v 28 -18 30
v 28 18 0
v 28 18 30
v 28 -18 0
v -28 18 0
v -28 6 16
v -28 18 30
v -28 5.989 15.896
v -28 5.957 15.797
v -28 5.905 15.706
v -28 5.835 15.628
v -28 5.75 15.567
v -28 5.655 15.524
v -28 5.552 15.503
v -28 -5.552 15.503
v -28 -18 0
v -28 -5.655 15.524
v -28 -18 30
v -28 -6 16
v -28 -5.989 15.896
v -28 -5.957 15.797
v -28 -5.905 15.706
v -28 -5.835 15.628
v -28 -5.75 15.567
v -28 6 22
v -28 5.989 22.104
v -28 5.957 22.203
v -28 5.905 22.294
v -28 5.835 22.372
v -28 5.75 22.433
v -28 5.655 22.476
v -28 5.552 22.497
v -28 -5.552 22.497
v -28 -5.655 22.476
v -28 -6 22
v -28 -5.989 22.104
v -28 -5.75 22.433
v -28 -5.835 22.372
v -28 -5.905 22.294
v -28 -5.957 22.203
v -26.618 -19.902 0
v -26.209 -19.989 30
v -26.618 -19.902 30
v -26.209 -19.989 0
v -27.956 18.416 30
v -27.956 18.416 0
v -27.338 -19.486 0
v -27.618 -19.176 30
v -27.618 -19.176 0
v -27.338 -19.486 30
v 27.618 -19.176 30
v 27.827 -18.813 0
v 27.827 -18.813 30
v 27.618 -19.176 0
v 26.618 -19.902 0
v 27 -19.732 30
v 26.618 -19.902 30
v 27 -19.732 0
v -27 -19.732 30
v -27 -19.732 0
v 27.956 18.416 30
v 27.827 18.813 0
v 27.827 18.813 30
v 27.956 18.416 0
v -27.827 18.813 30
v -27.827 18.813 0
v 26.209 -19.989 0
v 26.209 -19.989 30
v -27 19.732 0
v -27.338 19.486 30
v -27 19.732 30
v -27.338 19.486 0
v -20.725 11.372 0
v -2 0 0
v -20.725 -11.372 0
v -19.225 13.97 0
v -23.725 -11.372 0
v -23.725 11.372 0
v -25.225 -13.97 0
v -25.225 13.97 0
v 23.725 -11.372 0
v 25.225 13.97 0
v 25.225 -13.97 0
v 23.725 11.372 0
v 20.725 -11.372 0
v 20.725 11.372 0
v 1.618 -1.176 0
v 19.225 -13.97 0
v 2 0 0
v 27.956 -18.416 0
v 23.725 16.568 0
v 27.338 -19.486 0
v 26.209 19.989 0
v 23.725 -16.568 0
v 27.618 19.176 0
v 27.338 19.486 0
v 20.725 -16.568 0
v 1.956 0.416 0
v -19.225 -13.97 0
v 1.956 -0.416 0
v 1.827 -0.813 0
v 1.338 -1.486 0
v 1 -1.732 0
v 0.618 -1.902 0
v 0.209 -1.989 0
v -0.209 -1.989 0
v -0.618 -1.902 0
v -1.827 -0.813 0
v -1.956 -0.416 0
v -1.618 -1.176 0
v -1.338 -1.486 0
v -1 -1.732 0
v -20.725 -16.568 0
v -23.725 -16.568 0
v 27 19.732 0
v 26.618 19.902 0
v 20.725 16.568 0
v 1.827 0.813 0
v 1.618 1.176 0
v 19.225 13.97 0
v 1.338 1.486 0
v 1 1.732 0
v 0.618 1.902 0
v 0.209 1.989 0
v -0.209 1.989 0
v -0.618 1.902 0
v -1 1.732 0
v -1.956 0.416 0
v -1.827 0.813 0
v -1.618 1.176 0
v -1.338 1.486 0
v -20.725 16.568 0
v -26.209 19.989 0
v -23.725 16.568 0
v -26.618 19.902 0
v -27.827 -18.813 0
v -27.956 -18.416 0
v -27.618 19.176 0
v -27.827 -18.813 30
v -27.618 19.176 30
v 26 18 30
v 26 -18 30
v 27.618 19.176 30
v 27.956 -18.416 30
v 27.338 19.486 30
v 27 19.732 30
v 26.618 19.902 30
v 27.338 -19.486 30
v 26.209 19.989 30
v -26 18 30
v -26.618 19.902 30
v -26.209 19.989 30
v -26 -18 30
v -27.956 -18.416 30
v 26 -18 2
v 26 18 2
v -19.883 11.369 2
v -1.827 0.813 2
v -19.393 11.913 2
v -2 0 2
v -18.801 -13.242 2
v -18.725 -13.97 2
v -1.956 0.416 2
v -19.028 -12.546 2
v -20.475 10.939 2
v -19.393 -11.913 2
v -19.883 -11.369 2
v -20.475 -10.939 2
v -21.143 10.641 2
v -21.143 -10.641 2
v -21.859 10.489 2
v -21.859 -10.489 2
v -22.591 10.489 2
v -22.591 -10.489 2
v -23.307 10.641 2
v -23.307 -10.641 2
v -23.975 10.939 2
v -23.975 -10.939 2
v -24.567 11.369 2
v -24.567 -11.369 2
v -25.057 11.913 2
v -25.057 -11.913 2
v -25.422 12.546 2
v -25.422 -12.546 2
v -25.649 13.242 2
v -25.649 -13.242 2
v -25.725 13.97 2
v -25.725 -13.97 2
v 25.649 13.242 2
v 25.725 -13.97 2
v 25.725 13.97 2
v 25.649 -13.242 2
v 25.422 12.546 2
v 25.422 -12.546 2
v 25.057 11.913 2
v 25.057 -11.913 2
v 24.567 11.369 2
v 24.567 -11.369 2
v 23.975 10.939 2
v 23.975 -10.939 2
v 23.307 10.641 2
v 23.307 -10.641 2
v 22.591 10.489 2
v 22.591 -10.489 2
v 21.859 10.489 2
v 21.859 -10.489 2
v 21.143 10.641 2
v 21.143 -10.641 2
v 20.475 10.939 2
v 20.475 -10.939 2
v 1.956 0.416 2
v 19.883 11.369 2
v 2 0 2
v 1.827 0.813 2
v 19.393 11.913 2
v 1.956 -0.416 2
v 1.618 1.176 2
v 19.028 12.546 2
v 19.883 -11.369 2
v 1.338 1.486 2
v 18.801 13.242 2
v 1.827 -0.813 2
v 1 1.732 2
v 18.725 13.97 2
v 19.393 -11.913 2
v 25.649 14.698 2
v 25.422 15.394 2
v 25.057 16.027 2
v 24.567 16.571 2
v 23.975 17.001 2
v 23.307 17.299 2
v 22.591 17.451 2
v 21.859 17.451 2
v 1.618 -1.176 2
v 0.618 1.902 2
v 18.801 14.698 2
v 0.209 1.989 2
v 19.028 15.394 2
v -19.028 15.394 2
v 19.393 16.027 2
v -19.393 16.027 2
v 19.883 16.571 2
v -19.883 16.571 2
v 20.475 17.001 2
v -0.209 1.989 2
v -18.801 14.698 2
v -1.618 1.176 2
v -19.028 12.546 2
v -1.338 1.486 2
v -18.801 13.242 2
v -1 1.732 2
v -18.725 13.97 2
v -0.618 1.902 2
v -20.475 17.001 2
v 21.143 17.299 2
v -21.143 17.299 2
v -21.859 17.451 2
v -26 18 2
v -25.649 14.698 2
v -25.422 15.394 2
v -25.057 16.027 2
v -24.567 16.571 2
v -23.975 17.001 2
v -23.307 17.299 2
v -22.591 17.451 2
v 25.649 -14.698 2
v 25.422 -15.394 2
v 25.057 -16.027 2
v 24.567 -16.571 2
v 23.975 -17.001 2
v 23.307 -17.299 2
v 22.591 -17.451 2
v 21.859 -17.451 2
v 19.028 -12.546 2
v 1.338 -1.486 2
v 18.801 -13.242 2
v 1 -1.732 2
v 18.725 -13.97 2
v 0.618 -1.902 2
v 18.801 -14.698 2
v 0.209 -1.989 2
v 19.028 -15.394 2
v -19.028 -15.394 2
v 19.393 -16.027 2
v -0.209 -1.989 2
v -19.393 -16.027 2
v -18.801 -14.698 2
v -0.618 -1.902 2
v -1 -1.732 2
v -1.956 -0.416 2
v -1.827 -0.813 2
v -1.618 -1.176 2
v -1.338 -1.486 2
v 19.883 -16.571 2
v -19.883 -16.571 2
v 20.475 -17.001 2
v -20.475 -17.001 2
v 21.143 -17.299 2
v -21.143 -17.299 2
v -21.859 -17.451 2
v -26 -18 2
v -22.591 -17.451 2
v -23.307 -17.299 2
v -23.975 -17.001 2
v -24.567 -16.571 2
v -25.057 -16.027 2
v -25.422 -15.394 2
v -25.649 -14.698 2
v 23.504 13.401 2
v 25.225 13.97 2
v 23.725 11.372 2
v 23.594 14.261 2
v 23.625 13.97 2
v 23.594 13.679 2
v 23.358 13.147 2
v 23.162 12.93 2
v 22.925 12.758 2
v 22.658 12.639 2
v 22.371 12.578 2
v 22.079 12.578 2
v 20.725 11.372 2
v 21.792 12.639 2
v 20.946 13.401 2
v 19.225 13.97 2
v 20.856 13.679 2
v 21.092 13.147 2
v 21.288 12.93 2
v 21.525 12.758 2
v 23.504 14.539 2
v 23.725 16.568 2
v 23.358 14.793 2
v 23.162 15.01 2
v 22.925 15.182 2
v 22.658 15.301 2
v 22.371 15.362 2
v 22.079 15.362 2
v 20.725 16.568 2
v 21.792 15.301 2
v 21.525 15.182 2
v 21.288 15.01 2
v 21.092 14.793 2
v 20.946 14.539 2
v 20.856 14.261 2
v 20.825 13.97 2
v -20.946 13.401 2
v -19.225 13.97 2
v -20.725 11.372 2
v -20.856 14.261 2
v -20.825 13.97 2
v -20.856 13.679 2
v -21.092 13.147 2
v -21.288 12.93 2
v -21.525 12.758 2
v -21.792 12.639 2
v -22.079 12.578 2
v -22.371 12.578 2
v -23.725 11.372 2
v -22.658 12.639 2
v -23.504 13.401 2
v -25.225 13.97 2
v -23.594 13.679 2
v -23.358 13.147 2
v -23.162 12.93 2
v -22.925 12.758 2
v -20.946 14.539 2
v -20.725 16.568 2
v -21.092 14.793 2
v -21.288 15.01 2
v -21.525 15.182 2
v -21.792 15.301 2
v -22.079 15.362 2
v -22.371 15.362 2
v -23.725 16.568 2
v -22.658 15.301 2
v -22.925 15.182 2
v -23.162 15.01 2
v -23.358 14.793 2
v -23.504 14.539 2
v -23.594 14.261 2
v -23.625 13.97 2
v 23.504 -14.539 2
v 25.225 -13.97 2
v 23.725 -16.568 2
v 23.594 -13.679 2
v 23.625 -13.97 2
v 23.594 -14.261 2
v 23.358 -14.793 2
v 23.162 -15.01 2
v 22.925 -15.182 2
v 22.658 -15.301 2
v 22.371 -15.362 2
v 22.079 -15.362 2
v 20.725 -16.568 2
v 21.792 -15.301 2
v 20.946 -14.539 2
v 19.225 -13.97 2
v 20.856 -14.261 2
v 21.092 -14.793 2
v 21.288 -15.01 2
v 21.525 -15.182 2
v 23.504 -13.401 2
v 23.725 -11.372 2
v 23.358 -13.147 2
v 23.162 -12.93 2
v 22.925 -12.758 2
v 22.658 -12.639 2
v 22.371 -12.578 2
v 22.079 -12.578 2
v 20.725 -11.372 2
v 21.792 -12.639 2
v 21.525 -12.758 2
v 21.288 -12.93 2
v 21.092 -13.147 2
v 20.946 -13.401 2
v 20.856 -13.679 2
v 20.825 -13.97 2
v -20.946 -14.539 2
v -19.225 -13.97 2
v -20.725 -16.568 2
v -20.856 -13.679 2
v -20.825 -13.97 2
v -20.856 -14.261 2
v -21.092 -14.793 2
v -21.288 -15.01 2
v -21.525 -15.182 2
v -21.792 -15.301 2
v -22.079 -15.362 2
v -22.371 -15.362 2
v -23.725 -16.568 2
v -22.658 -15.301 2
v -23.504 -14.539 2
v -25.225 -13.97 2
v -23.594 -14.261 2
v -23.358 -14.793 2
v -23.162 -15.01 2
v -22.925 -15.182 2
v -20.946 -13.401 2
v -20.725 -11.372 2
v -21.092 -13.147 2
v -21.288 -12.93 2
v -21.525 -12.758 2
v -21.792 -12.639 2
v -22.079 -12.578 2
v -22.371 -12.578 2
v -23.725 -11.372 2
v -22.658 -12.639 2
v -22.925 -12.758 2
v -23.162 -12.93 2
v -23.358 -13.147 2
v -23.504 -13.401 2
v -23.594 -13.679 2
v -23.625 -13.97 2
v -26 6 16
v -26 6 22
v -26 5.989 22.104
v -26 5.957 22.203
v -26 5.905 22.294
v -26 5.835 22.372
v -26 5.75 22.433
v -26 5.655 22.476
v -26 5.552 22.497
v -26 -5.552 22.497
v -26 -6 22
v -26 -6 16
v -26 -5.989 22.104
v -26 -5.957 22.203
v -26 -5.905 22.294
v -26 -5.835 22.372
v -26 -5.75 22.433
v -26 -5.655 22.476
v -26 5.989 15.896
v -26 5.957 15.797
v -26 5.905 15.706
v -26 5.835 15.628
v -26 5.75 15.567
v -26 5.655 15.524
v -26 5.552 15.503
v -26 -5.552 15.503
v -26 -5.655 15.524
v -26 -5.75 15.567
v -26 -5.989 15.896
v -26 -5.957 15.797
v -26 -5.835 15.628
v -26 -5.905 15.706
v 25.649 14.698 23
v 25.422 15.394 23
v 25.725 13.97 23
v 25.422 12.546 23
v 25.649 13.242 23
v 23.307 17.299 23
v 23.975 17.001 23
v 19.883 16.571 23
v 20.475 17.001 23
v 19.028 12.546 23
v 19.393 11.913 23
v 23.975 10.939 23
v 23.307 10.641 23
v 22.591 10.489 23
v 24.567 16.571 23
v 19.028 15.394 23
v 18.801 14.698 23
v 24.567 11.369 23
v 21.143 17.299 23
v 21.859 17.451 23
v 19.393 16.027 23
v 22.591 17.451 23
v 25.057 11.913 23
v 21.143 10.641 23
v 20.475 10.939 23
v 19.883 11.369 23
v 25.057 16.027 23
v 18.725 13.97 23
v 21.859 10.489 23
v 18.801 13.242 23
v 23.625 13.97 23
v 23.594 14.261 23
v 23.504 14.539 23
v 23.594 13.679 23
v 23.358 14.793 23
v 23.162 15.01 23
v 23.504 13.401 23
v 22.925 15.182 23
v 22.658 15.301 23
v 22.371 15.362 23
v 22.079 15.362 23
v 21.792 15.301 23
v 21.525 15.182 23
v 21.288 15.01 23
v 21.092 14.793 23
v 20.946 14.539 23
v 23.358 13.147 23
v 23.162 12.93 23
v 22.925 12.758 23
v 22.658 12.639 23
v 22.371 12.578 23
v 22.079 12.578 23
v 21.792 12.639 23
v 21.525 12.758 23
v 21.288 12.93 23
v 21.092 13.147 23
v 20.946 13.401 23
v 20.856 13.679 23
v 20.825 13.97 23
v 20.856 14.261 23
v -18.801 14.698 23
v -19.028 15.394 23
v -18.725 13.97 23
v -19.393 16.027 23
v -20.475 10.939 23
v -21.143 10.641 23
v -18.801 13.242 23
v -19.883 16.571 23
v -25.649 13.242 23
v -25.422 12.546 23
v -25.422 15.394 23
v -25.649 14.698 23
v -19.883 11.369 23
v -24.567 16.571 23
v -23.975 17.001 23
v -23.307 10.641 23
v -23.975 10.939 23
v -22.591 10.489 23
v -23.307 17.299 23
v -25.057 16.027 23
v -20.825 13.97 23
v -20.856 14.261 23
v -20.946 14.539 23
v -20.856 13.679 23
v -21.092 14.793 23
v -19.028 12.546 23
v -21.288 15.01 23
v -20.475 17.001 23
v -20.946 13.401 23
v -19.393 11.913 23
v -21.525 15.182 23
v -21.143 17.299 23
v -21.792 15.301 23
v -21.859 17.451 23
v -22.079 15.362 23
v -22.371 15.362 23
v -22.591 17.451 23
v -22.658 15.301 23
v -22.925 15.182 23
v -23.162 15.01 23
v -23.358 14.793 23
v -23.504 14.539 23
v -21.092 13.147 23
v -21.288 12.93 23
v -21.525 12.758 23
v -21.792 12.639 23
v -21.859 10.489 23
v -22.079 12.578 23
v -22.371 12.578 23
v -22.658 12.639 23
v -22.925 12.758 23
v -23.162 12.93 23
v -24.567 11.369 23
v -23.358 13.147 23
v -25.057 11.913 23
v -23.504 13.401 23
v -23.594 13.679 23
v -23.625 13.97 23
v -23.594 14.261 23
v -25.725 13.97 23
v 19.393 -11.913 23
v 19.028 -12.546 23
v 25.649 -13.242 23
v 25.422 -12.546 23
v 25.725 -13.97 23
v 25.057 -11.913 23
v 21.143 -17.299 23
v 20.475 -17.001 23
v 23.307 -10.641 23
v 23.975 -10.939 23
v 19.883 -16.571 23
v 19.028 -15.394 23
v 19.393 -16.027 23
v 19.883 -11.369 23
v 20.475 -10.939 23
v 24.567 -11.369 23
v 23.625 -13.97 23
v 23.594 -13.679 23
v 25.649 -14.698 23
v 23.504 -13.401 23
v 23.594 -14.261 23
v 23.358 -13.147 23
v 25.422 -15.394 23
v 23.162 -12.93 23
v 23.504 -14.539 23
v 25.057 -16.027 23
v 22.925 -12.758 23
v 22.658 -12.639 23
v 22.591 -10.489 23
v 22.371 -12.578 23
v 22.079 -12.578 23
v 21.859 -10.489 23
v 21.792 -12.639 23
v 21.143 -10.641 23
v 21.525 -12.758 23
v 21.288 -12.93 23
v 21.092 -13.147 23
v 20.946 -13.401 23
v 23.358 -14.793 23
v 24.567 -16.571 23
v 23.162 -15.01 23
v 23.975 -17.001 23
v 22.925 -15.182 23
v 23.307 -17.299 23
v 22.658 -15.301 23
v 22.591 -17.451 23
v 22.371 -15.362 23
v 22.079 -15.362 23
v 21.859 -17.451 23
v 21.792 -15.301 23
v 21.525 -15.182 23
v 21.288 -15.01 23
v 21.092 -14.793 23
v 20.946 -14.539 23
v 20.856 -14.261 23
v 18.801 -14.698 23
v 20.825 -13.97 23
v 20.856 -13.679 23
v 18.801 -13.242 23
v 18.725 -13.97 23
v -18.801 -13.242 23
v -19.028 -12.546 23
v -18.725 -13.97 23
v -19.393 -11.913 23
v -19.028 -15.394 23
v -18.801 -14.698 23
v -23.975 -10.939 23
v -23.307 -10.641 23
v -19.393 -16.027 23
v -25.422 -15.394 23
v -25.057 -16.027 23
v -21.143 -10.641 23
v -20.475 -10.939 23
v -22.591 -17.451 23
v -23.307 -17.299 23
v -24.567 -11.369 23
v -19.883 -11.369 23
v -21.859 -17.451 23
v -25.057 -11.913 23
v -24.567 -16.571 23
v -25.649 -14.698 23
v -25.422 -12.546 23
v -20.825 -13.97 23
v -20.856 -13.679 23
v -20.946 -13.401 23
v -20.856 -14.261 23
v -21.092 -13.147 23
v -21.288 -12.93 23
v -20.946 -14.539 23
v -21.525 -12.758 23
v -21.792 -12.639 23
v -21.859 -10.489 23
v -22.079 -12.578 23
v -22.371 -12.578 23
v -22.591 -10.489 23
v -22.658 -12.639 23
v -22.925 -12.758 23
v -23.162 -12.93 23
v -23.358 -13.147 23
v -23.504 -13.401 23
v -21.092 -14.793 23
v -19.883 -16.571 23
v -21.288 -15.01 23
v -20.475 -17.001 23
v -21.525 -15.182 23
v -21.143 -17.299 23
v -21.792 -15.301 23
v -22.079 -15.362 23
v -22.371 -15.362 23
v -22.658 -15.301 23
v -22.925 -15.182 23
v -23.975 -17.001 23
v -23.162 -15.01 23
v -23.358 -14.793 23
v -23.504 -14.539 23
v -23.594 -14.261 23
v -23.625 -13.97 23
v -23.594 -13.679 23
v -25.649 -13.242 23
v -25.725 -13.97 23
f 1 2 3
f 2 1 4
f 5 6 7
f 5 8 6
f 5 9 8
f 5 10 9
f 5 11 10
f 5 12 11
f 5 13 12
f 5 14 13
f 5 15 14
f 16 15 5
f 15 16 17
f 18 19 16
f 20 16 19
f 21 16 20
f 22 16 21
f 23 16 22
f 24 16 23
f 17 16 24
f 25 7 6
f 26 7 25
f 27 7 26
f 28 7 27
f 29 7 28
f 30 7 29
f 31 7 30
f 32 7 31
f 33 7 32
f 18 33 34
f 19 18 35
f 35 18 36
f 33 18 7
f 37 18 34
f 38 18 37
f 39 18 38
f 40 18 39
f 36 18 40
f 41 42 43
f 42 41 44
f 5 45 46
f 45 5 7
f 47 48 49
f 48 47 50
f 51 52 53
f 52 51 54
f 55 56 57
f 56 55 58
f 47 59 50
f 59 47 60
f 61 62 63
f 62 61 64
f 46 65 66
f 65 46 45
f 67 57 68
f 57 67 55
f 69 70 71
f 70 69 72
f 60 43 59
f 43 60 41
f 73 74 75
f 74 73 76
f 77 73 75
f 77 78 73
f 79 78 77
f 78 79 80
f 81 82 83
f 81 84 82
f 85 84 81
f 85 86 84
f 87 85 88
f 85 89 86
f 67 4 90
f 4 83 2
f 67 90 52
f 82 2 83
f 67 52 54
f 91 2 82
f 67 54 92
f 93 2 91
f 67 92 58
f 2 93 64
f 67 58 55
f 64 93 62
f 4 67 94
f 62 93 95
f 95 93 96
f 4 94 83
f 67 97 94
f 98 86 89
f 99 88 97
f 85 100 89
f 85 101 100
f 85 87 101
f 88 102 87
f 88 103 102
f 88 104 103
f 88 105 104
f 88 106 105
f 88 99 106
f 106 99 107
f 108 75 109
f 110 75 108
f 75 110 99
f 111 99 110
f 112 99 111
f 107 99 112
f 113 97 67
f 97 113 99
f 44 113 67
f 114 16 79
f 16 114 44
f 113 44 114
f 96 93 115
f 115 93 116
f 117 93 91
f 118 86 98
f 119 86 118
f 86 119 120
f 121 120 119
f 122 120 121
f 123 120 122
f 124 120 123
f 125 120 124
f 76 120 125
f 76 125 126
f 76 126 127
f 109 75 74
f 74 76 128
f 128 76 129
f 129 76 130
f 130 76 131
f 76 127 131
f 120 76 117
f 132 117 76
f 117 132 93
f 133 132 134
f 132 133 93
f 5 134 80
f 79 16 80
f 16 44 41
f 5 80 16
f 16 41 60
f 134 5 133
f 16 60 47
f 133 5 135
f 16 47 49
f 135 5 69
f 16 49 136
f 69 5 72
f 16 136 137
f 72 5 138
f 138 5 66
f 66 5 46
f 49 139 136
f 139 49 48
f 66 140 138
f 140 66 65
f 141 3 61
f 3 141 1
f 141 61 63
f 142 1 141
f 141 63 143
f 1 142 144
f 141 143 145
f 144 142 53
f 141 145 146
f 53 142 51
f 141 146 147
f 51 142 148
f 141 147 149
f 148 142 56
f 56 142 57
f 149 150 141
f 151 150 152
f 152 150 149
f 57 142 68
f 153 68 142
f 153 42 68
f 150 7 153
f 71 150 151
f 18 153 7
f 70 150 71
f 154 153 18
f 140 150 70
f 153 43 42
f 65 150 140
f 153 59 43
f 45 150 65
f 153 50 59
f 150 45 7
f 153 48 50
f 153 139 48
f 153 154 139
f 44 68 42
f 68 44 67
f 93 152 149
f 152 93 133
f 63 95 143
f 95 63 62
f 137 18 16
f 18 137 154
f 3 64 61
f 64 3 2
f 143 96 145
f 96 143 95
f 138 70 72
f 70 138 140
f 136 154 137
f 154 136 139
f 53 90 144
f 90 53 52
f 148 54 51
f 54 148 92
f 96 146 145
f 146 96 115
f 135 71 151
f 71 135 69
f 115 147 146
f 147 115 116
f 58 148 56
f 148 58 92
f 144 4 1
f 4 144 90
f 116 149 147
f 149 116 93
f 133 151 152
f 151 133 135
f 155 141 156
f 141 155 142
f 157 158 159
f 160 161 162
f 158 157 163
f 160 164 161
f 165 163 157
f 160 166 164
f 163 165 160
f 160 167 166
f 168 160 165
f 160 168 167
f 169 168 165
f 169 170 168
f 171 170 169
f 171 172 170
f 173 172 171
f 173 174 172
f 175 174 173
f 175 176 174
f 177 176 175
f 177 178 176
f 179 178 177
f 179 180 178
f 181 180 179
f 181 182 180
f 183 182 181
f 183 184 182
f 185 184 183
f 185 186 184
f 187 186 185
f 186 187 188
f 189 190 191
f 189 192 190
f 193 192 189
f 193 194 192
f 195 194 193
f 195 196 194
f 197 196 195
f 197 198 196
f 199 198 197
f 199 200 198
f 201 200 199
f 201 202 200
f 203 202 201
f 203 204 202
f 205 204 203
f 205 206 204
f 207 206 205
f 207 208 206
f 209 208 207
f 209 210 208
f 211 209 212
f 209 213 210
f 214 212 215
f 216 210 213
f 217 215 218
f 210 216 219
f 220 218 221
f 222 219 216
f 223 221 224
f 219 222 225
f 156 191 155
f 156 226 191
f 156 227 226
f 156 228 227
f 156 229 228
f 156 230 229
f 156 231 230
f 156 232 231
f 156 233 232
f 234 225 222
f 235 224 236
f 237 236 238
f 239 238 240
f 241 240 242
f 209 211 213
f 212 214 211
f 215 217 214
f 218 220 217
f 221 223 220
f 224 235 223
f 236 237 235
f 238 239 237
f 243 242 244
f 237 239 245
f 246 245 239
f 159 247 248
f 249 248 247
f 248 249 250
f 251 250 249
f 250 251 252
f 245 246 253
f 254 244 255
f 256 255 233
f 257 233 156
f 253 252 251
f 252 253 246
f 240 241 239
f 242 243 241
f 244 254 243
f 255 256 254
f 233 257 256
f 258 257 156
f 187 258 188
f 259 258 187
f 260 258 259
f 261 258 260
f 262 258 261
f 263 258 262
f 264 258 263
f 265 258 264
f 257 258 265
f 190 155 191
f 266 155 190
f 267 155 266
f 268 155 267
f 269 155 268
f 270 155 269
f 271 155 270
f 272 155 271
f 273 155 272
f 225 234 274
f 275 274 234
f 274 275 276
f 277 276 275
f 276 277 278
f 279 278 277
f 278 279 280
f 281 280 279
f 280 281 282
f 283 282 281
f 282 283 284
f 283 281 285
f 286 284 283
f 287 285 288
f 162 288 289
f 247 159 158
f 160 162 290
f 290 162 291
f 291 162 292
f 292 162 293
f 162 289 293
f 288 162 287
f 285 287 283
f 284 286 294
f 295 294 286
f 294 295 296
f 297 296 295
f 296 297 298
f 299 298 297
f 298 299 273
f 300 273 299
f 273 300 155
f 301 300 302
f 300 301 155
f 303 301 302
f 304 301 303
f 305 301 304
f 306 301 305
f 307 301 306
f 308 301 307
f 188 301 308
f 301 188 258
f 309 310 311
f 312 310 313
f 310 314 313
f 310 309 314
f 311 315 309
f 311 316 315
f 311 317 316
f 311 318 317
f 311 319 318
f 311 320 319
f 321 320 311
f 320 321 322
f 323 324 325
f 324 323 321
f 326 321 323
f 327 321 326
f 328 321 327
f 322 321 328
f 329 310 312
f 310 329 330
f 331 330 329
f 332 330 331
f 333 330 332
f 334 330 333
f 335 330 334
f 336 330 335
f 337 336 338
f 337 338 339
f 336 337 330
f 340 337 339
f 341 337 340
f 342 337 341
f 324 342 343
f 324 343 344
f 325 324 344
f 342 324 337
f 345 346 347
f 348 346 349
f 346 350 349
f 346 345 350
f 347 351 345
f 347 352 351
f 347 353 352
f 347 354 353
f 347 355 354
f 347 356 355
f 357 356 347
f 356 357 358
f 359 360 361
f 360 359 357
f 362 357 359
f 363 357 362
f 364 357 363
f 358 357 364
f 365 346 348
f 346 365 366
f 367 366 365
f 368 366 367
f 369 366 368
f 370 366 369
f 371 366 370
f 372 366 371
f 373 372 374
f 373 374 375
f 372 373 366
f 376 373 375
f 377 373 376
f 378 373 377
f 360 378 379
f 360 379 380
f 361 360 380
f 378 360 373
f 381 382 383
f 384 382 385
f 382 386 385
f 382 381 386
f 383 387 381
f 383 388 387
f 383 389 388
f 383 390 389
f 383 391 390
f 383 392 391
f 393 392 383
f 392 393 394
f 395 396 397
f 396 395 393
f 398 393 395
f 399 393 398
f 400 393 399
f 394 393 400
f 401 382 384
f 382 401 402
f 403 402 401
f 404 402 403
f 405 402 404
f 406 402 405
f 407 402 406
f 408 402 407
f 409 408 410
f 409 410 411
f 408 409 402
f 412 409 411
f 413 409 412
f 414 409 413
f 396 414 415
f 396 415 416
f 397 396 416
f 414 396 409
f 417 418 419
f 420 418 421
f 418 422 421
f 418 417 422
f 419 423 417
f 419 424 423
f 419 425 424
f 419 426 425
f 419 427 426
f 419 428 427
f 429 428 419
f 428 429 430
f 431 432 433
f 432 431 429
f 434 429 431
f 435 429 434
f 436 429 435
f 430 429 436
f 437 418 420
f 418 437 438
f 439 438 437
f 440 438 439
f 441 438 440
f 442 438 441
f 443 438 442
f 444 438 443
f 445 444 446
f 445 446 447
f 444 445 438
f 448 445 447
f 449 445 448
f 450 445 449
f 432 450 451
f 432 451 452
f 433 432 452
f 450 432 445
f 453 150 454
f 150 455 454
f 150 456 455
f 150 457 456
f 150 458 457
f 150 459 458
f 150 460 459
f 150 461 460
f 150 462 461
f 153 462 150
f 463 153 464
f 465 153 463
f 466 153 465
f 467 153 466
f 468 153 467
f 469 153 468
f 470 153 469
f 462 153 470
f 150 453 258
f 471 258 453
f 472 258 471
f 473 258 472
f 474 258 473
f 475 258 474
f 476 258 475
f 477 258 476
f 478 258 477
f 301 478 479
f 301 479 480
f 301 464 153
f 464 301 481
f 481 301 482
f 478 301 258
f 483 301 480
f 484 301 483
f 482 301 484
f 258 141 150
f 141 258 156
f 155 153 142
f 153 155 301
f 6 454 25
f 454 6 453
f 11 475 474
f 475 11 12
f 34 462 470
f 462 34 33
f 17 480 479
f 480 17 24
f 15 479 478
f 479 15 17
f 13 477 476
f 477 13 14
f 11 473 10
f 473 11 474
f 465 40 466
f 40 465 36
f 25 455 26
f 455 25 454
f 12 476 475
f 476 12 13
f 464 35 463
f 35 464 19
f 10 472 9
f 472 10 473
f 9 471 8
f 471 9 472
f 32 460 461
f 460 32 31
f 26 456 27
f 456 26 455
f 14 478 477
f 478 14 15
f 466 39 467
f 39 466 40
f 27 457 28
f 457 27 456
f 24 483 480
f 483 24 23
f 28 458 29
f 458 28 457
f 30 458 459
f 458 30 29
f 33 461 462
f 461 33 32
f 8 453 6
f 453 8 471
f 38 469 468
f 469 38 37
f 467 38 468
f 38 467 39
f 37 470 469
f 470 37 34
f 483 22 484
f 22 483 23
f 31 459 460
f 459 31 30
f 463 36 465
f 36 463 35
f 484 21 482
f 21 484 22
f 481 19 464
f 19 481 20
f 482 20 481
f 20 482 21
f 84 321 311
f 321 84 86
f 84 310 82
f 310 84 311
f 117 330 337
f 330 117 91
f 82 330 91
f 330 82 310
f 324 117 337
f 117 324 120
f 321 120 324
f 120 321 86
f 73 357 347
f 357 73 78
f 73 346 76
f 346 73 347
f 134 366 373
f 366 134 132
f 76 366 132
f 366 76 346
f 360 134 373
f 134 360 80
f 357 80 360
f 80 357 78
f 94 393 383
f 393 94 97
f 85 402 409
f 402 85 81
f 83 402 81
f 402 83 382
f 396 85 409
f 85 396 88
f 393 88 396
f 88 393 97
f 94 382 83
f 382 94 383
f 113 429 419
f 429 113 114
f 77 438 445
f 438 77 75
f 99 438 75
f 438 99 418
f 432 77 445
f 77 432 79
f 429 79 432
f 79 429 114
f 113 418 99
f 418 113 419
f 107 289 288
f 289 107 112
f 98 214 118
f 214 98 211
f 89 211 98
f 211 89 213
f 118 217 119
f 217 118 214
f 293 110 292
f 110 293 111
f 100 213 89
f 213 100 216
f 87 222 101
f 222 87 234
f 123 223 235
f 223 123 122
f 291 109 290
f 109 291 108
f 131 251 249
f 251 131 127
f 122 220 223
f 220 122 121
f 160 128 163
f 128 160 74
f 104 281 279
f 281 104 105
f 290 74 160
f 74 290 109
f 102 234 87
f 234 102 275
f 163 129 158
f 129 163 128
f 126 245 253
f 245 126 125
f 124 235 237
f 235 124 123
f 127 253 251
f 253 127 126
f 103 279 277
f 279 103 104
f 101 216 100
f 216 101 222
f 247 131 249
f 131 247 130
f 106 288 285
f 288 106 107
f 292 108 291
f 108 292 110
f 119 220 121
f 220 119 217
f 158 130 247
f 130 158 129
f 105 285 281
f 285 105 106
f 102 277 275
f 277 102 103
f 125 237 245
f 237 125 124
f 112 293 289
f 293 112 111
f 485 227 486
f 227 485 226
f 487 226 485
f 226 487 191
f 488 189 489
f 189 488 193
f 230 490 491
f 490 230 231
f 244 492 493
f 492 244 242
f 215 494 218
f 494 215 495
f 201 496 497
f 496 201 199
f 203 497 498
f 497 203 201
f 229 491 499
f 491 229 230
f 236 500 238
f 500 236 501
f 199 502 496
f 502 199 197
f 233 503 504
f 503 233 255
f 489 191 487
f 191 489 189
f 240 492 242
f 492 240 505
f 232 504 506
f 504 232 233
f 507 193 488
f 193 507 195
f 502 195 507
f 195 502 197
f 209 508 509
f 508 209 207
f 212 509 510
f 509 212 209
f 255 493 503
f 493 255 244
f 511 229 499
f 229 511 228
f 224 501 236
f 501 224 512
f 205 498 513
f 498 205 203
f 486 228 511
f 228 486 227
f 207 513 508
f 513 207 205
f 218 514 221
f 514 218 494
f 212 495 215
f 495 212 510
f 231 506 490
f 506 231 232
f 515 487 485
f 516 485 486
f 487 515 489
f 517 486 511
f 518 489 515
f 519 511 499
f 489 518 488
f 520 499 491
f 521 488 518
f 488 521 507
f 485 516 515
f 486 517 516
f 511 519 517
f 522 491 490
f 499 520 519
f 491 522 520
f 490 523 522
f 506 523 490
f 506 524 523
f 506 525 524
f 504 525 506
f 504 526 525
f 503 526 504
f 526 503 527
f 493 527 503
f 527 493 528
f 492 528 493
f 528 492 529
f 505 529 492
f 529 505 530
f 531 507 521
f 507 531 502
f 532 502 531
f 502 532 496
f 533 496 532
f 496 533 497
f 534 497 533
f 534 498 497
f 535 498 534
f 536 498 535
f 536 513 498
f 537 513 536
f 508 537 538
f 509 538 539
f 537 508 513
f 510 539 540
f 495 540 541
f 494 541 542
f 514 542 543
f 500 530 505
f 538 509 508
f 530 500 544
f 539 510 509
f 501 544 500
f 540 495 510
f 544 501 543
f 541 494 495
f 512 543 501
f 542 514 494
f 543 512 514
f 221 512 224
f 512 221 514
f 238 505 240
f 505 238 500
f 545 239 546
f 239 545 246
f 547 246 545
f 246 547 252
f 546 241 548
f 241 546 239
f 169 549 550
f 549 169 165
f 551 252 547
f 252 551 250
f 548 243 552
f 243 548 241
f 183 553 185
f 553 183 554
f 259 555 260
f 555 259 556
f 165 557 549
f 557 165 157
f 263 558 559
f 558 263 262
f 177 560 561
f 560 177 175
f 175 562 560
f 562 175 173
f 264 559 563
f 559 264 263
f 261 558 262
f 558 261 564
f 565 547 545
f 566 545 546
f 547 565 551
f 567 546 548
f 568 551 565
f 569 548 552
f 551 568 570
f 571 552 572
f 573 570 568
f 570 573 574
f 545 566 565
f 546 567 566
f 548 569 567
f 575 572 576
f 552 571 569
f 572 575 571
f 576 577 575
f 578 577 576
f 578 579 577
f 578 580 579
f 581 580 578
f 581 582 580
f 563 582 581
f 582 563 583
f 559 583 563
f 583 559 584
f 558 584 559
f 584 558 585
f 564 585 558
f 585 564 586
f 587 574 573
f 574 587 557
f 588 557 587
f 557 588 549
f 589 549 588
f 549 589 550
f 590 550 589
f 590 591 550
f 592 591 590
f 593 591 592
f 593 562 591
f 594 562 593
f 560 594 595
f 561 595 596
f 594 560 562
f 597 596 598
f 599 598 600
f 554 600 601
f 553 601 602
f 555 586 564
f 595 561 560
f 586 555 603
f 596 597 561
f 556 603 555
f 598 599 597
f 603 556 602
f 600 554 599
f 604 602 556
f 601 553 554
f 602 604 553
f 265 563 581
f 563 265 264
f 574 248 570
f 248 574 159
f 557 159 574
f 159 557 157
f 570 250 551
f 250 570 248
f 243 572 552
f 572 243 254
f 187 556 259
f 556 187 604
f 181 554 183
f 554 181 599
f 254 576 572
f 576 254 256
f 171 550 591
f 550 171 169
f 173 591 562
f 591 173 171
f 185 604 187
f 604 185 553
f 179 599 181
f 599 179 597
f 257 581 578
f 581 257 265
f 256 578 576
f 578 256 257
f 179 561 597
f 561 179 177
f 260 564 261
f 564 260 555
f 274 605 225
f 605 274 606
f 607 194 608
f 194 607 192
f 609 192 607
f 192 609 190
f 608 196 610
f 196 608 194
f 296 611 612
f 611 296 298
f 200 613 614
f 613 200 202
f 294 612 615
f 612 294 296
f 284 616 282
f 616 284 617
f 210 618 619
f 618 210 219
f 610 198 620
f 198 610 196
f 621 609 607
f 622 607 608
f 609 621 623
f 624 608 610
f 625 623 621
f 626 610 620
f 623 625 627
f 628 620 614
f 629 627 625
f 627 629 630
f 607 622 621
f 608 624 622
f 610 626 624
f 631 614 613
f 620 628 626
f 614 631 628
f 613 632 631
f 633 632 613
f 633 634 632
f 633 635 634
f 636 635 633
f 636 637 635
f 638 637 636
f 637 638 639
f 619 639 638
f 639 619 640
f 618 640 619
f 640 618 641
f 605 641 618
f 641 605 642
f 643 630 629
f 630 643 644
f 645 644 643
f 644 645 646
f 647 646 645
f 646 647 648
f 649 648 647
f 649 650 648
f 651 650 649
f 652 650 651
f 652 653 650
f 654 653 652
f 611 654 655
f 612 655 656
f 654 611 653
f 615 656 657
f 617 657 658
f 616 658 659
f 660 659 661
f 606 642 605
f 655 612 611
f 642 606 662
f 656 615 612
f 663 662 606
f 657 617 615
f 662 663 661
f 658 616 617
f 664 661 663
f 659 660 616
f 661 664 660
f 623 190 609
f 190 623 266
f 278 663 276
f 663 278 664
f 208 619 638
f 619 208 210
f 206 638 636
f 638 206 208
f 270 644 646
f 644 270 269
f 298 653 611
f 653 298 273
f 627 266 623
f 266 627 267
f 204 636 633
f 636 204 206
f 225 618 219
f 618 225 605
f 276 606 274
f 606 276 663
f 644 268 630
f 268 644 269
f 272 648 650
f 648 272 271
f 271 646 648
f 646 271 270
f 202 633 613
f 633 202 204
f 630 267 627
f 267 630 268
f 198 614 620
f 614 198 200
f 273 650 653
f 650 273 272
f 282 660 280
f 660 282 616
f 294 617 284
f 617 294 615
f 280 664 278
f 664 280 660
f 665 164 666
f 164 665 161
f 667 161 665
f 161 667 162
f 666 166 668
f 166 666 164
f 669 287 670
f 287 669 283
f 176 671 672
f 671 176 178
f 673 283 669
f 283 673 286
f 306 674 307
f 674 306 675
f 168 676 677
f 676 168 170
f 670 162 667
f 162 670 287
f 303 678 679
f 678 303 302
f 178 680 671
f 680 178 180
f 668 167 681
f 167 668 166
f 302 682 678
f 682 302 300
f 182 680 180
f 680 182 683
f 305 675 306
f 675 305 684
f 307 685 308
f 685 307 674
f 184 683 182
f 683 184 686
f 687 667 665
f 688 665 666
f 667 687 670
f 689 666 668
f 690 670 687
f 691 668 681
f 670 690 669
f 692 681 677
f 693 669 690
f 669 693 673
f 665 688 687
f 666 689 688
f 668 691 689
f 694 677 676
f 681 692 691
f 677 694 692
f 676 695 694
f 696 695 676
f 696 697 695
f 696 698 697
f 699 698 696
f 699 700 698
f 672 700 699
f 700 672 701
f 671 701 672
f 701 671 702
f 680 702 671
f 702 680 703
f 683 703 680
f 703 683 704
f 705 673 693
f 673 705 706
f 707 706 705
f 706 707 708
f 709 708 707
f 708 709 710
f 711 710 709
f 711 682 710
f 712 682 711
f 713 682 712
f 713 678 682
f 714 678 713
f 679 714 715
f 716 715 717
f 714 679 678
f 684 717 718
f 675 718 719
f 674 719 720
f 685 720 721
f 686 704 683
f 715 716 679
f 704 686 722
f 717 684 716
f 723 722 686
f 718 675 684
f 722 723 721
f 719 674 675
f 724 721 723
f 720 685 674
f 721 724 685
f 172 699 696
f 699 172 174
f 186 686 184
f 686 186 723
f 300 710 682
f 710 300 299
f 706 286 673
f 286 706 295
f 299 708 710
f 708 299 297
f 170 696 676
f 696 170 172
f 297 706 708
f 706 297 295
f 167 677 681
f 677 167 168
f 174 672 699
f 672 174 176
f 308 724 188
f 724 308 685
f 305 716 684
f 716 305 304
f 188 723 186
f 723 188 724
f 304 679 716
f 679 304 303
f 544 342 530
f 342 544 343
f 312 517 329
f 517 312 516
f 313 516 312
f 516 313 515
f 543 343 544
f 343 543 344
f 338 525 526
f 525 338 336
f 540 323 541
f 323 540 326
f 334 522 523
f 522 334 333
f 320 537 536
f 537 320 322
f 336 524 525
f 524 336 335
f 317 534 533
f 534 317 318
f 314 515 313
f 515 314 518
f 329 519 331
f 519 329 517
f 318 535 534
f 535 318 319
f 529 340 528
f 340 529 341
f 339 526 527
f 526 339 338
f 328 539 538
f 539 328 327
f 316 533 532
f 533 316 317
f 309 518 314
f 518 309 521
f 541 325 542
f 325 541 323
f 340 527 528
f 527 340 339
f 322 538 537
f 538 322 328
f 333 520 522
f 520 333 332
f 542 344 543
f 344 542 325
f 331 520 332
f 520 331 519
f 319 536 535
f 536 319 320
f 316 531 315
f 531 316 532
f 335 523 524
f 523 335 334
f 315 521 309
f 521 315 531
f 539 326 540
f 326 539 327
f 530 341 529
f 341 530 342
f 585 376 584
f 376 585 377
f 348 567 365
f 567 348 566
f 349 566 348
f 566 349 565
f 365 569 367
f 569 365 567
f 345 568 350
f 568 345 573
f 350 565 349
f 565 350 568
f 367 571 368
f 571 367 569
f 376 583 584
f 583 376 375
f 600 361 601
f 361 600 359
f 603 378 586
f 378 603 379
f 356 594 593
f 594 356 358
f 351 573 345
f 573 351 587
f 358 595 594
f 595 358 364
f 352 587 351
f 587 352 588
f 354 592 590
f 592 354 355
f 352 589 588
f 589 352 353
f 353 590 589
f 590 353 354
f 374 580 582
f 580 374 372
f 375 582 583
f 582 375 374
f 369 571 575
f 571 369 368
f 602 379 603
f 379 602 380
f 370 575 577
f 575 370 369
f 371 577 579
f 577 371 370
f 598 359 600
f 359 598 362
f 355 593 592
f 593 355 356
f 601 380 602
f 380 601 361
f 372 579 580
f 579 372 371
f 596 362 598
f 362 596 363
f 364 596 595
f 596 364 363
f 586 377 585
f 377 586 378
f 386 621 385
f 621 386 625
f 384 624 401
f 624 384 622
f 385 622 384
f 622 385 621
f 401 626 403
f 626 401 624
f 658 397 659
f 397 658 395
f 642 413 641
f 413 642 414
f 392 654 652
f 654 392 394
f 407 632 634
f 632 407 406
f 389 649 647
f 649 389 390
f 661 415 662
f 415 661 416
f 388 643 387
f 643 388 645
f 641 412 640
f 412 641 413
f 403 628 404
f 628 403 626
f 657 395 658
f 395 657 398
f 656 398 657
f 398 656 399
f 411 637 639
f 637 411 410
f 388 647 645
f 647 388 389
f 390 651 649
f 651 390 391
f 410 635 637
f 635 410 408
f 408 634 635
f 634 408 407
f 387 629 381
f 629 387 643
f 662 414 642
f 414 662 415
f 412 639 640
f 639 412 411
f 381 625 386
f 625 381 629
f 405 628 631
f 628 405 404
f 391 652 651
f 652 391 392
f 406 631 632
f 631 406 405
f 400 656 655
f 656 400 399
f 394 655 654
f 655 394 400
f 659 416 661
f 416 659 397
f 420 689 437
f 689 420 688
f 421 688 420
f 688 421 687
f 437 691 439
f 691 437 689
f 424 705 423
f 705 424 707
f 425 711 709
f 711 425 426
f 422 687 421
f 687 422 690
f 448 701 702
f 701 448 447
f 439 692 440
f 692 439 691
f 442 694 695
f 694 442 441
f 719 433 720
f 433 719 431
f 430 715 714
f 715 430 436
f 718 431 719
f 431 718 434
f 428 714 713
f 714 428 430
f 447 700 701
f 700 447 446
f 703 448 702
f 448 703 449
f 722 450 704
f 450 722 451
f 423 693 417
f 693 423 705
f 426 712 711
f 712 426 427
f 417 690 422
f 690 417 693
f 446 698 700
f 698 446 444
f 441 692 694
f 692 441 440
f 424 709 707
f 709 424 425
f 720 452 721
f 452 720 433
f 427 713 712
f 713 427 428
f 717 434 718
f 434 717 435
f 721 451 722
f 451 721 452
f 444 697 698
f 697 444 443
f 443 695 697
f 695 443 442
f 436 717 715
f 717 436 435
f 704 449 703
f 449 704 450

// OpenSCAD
$fn=30;
bolt_delta_x = 44.45;
bolt_delta_y = 27.94;
bolt_diameter = 7.0;


module  usb_hole(){
    translate([0.0, 0.0, -1.0]) 
    minkowski() {
        cube([11.0, 6.0, 4.0], center = true);
        cylinder(h = 2.0, r = 0.5);
    }
    
}
module case() {
    difference() {
        union() {
            translate([-0.0, 0.0, 13.0]) minkowski() {
                cube([52.0, 36.0, 26.0], center=true);
                cylinder(h = 4.0, r = 2.0);
            };
        }
        translate([-26.0, -18.0, 2.0]) cube([52.0, 36.0, 30.0]);

        translate([-26.0, 0.0, 30.0 - 11.0]) rotate([90.0, 0.0, 90.0]) usb_hole(); 

        translate([bolt_delta_x / 2.0, bolt_delta_y / 2.0, -1]) cylinder($fn=6, h = 4.0, d = 6.0);
        translate([-bolt_delta_x / 2.0, bolt_delta_y / 2.0, -1]) cylinder($fn=6, h = 4.0, d = 6.0);
        translate([bolt_delta_x / 2.0, -bolt_delta_y / 2.0, -1]) cylinder($fn=6, h = 4.0, d = 6.0);
        translate([-bolt_delta_x / 2.0, -bolt_delta_y / 2.0, -1]) cylinder($fn=6, h = 4.0, d = 6.0);
        
        translate([0.0, 0.0, -1.0]) cylinder(h = 4.0, d = 4.0);
    }
    difference() {
        union() {
            translate([bolt_delta_x / 2.0, bolt_delta_y / 2.0, 2.0]) cylinder(h = 21.0, d = bolt_diameter);
            translate([-bolt_delta_x / 2.0, bolt_delta_y / 2.0, 2.0]) cylinder(h = 21.0, d = bolt_diameter);
            translate([bolt_delta_x / 2.0, -bolt_delta_y / 2.0, 2.0]) cylinder(h = 21.0, d = bolt_diameter);
            translate([-bolt_delta_x / 2.0, -bolt_delta_y / 2.0, 2.0]) cylinder(h = 21.0, d = bolt_diameter);
        };
        translate([bolt_delta_x / 2.0, bolt_delta_y / 2.0, 1.0]) cylinder(h = 23.0, d = 2.8);
        translate([-bolt_delta_x / 2.0, bolt_delta_y / 2.0, 1.0]) cylinder(h = 23.0, d = 2.8);
        translate([bolt_delta_x / 2.0, -bolt_delta_y / 2.0, 1.0]) cylinder(h = 23.0, d = 2.8);
        translate([-bolt_delta_x / 2.0, -bolt_delta_y / 2.0, 1.0]) cylinder(h = 23.0, d = 2.8);
    }
}
module baseplate()
{
    difference() {
        union() {
            translate([-26.0, -18.0, 0]) minkowski() {
                cube([52.0, 36.0, 1.0]);
                cylinder(h = 1.0, r =2.0);
            };
            translate([bolt_delta_x / 2.0, bolt_delta_y / 2.0, 0]) cylinder(h = 8.5, d = bolt_diameter);
            translate([-bolt_delta_x / 2.0, bolt_delta_y / 2.0, 0]) cylinder(h = 8.5, d = bolt_diameter);
            translate([bolt_delta_x / 2.0, -bolt_delta_y / 2.0, 0]) cylinder(h = 8.5, d = bolt_diameter);
            translate([-bolt_delta_x / 2.0, -bolt_delta_y / 2.0, 0]) cylinder(h = 8.5, d = bolt_diameter);
        }
        translate([26.0 - 8.8, 0, -1]) cylinder(h = 9.5, d = 7.6);
        translate([26.0 - 50.0 + 8.2, -6.0, -1.0]) cube([25.0, 12.0, 4.0]);
        translate([bolt_delta_x / 2, bolt_delta_y / 2, -1]) cylinder(h = 11.5, d = 2.8);
        translate([-bolt_delta_x / 2, bolt_delta_y / 2, -1]) cylinder(h = 11.5, d = 2.8);
        translate([bolt_delta_x / 2, -bolt_delta_y / 2, -1]) cylinder(h = 11.5, d = 2.8);
        translate([-bolt_delta_x / 2, -bolt_delta_y / 2, -1]) cylinder(h = 11.5, d =2.8);
        translate([bolt_delta_x / 2, bolt_delta_y / 2, -1]) cylinder(h = 3.0, d = 5.0);
        translate([-bolt_delta_x / 2, bolt_delta_y / 2, -1]) cylinder(h = 3.0, d = 5.0);
        translate([bolt_delta_x / 2, -bolt_delta_y / 2, -1]) cylinder(h = 3.0, d = 5.0);
        translate([-bolt_delta_x / 2, -bolt_delta_y / 2, -1]) cylinder(h = 3.0, d = 5.0);
    }
}

// baseplate();
case();
// translate([6,0,3]) usb_hole();
